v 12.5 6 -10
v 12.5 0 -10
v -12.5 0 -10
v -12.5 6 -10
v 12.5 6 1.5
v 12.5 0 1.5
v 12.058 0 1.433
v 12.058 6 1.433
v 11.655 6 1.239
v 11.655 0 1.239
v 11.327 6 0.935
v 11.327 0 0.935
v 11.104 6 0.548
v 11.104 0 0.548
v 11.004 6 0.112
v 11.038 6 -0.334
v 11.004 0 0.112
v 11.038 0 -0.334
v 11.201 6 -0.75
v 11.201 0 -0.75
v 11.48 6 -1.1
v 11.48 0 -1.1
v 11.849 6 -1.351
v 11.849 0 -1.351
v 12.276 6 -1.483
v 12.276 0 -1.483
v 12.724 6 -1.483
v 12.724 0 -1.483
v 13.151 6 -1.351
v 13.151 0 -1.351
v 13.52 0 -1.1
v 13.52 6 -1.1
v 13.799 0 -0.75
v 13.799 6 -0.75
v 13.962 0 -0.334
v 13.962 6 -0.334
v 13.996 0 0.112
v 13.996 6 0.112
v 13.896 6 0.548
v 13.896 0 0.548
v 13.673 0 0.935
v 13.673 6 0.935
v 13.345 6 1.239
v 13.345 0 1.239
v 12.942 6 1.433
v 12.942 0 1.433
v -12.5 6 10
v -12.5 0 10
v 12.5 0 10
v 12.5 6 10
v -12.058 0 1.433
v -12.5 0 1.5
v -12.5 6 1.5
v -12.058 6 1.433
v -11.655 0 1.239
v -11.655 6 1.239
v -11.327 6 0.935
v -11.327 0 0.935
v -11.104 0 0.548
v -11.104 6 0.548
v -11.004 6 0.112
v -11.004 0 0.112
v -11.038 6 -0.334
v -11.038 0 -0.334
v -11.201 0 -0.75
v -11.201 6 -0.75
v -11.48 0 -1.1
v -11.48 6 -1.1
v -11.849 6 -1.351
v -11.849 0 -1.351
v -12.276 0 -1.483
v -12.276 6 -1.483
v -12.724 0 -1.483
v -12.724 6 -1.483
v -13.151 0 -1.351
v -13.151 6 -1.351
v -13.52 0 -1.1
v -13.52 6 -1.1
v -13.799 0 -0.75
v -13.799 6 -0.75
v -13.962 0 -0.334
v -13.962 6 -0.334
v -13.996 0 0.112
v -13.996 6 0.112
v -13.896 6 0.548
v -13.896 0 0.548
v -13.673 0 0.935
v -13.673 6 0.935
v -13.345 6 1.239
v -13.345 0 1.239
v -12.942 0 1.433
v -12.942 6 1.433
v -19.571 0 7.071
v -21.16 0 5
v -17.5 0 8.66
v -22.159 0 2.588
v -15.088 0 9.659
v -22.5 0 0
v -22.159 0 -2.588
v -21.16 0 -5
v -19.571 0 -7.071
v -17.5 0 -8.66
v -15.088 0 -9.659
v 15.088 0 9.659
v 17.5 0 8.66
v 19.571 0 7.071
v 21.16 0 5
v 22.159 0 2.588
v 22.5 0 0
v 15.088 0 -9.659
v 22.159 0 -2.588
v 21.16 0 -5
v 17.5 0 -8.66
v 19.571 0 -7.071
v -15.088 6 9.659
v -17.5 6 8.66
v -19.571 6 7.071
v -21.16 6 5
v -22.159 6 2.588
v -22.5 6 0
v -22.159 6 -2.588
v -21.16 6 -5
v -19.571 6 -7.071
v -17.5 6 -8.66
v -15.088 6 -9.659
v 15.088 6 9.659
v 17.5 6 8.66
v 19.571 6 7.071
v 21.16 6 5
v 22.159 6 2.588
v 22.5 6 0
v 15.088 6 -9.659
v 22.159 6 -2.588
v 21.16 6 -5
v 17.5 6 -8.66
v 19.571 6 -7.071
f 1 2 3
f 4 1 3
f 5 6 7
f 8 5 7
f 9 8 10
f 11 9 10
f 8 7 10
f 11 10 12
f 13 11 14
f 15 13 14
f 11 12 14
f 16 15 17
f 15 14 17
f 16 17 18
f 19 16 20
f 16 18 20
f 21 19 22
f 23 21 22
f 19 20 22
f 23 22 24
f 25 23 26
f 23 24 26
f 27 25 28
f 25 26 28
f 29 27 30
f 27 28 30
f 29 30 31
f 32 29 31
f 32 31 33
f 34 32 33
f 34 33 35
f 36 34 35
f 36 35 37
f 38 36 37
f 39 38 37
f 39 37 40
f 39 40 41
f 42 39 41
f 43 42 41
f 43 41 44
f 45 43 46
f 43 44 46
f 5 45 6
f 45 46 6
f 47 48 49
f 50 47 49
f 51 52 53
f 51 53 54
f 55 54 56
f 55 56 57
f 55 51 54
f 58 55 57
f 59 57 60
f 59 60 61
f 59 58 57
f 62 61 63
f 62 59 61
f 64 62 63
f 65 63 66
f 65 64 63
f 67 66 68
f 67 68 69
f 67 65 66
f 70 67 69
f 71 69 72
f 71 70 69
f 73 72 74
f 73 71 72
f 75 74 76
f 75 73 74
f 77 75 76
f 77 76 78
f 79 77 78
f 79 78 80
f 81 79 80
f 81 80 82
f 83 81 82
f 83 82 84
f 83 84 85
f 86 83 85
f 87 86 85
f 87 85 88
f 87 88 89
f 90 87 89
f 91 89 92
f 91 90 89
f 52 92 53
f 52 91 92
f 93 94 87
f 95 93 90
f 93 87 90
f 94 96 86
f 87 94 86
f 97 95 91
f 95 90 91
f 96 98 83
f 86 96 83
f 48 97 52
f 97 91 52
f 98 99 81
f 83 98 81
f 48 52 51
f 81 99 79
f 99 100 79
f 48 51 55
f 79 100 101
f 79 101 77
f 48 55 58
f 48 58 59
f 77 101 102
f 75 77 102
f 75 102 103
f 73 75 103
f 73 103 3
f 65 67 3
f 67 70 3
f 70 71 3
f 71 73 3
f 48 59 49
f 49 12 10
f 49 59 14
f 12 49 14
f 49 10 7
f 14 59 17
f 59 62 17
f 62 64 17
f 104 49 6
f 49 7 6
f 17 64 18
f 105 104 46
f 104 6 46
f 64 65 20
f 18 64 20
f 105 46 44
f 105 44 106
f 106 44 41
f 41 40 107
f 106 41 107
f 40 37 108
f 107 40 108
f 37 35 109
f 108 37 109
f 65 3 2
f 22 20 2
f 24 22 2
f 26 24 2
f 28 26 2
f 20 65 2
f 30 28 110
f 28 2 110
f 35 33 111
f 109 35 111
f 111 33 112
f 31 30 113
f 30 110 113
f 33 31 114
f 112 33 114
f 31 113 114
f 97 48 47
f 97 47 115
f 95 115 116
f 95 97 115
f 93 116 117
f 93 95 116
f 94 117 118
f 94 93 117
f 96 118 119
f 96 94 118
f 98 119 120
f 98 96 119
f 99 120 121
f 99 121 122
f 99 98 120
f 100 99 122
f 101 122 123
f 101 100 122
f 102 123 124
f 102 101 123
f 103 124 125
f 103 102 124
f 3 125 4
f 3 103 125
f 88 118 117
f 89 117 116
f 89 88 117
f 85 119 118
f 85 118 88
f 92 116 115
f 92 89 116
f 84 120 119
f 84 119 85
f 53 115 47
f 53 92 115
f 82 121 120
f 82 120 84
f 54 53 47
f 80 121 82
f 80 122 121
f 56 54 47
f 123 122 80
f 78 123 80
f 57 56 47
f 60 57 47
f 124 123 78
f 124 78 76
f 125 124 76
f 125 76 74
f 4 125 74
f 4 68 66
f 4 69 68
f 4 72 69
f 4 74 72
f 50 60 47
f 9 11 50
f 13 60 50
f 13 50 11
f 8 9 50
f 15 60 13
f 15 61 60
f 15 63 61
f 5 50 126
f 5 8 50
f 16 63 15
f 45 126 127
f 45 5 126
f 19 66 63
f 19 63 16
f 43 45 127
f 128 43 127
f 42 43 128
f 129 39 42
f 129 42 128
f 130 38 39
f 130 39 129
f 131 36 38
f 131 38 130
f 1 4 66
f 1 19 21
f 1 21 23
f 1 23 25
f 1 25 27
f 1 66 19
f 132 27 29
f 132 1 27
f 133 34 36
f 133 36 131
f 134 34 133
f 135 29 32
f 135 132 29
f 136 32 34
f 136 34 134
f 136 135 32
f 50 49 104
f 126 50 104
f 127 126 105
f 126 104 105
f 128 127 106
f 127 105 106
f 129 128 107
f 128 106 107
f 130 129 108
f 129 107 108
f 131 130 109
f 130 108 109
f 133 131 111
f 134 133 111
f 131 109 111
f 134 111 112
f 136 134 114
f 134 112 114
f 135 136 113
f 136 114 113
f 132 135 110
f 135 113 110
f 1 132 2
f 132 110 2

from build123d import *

# Parameters (mm, degrees)
SKETCH1_R           = 1.5
BOSS_EXTRUDE1_DEPTH = 6


with BuildPart() as part:
    # Sketch1 → Boss-Extrude1 (new body)
    with BuildSketch(Plane(origin=(0, 0, 0), x_dir=(1, 0, 0), z_dir=(0, 1, 0))):
        with BuildLine():
            Line((-12.5, 10), (0, 10))
            Line((0, 10), (0, -10))
            Line((0, -10), (-12.5, -10))
            ThreePointArc((-12.5, -10), (-22.5, 0), (-12.5, 10))
        make_face()
        with Locations(Location((-12.5, 0, 0), (0, 0, 270))):
            Circle(SKETCH1_R, mode=Mode.SUBTRACT)
    boss_extrude1 = extrude(amount=BOSS_EXTRUDE1_DEPTH)

    # Mirror1: Boss-Extrude1 across plane
    add(boss_extrude1.mirror(Plane(origin=(0, 6, -10), x_dir=(0, 0, 1), z_dir=(-1, 0, 0))))


solid = part.part
